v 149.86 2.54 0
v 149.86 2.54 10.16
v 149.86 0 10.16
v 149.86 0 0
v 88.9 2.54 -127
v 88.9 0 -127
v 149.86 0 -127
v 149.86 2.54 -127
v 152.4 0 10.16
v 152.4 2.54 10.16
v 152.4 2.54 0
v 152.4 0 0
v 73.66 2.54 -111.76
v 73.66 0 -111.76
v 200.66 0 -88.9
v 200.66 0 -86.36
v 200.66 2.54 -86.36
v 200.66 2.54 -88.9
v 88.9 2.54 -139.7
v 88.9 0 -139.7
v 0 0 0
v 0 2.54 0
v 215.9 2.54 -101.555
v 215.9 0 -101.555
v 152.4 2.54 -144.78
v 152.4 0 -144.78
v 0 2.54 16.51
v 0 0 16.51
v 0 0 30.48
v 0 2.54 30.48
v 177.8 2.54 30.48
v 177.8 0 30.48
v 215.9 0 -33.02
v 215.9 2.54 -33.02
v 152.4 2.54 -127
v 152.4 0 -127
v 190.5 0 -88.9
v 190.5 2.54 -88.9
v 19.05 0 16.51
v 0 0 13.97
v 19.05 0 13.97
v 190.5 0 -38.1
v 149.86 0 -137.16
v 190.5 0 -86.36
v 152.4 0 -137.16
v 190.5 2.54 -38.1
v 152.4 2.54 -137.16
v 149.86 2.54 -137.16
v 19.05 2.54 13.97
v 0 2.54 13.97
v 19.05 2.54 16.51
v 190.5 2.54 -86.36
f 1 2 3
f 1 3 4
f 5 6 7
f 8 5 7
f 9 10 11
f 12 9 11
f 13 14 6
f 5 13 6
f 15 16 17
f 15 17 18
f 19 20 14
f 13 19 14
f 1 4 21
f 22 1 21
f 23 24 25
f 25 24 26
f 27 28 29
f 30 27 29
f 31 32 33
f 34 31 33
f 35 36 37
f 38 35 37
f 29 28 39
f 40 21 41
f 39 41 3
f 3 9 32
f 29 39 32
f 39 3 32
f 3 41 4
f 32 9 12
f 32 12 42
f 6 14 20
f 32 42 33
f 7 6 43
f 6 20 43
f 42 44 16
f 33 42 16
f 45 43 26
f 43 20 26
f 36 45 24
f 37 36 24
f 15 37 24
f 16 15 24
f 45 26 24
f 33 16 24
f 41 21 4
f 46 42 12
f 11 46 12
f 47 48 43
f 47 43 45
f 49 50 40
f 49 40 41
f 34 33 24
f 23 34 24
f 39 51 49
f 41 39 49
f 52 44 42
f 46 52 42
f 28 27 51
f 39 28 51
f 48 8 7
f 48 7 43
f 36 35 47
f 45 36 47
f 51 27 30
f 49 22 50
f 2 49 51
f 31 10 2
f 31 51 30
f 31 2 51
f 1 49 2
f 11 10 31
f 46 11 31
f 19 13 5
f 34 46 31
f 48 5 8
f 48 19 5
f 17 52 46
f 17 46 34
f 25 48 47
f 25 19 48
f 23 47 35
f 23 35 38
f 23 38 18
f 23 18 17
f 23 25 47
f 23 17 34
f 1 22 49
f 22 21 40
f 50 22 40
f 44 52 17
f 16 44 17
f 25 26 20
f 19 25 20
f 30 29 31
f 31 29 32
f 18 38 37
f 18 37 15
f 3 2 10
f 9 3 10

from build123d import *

# Parameters (mm, degrees)
BOSS_EXTRUDE1_DEPTH = 2.54
SKETCH2_W           = 19.05
SKETCH2_H           = 2.54
SKETCH2_W_2         = 2.54
SKETCH2_H_2         = 10.16
SKETCH2_W_3         = 10.16
CUT_EXTRUDE1_DEPTH  = 3.54


with BuildPart() as part:
    # Sketch1 → Boss-Extrude1 (new body)
    with BuildSketch(Plane(origin=(0, 0, 0), x_dir=(1, 0, 0), z_dir=(0, 1, 0))):
        Polygon((0, 0), (0, -30.48), (177.8, -30.48), (215.9, 33.02), (215.9, 101.555269233), (152.4, 144.78), (88.9, 139.7), (73.66, 111.76), (88.9, 127), (152.4, 127), (190.5, 88.9), (190.5, 38.1), (152.4, 0), align=None)
    extrude(amount=BOSS_EXTRUDE1_DEPTH)

    # Sketch2 → Cut-Extrude1 (cut, through all)
    with BuildSketch(Plane(origin=(0, 2.54, 0), x_dir=(1, 0, 0), z_dir=(0, 1, 0))):
        with Locations((9.525, -15.24)):
            Rectangle(SKETCH2_W, SKETCH2_H)
        with Locations((151.13, -5.08)):
            Rectangle(SKETCH2_W_2, SKETCH2_H_2)
        with Locations((195.58, 87.63)):
            Rectangle(SKETCH2_W_3, SKETCH2_H)
        with Locations((151.13, 132.08)):
            Rectangle(SKETCH2_W_2, SKETCH2_H_2)
    extrude(amount=-CUT_EXTRUDE1_DEPTH, mode=Mode.SUBTRACT)


solid = part.part
